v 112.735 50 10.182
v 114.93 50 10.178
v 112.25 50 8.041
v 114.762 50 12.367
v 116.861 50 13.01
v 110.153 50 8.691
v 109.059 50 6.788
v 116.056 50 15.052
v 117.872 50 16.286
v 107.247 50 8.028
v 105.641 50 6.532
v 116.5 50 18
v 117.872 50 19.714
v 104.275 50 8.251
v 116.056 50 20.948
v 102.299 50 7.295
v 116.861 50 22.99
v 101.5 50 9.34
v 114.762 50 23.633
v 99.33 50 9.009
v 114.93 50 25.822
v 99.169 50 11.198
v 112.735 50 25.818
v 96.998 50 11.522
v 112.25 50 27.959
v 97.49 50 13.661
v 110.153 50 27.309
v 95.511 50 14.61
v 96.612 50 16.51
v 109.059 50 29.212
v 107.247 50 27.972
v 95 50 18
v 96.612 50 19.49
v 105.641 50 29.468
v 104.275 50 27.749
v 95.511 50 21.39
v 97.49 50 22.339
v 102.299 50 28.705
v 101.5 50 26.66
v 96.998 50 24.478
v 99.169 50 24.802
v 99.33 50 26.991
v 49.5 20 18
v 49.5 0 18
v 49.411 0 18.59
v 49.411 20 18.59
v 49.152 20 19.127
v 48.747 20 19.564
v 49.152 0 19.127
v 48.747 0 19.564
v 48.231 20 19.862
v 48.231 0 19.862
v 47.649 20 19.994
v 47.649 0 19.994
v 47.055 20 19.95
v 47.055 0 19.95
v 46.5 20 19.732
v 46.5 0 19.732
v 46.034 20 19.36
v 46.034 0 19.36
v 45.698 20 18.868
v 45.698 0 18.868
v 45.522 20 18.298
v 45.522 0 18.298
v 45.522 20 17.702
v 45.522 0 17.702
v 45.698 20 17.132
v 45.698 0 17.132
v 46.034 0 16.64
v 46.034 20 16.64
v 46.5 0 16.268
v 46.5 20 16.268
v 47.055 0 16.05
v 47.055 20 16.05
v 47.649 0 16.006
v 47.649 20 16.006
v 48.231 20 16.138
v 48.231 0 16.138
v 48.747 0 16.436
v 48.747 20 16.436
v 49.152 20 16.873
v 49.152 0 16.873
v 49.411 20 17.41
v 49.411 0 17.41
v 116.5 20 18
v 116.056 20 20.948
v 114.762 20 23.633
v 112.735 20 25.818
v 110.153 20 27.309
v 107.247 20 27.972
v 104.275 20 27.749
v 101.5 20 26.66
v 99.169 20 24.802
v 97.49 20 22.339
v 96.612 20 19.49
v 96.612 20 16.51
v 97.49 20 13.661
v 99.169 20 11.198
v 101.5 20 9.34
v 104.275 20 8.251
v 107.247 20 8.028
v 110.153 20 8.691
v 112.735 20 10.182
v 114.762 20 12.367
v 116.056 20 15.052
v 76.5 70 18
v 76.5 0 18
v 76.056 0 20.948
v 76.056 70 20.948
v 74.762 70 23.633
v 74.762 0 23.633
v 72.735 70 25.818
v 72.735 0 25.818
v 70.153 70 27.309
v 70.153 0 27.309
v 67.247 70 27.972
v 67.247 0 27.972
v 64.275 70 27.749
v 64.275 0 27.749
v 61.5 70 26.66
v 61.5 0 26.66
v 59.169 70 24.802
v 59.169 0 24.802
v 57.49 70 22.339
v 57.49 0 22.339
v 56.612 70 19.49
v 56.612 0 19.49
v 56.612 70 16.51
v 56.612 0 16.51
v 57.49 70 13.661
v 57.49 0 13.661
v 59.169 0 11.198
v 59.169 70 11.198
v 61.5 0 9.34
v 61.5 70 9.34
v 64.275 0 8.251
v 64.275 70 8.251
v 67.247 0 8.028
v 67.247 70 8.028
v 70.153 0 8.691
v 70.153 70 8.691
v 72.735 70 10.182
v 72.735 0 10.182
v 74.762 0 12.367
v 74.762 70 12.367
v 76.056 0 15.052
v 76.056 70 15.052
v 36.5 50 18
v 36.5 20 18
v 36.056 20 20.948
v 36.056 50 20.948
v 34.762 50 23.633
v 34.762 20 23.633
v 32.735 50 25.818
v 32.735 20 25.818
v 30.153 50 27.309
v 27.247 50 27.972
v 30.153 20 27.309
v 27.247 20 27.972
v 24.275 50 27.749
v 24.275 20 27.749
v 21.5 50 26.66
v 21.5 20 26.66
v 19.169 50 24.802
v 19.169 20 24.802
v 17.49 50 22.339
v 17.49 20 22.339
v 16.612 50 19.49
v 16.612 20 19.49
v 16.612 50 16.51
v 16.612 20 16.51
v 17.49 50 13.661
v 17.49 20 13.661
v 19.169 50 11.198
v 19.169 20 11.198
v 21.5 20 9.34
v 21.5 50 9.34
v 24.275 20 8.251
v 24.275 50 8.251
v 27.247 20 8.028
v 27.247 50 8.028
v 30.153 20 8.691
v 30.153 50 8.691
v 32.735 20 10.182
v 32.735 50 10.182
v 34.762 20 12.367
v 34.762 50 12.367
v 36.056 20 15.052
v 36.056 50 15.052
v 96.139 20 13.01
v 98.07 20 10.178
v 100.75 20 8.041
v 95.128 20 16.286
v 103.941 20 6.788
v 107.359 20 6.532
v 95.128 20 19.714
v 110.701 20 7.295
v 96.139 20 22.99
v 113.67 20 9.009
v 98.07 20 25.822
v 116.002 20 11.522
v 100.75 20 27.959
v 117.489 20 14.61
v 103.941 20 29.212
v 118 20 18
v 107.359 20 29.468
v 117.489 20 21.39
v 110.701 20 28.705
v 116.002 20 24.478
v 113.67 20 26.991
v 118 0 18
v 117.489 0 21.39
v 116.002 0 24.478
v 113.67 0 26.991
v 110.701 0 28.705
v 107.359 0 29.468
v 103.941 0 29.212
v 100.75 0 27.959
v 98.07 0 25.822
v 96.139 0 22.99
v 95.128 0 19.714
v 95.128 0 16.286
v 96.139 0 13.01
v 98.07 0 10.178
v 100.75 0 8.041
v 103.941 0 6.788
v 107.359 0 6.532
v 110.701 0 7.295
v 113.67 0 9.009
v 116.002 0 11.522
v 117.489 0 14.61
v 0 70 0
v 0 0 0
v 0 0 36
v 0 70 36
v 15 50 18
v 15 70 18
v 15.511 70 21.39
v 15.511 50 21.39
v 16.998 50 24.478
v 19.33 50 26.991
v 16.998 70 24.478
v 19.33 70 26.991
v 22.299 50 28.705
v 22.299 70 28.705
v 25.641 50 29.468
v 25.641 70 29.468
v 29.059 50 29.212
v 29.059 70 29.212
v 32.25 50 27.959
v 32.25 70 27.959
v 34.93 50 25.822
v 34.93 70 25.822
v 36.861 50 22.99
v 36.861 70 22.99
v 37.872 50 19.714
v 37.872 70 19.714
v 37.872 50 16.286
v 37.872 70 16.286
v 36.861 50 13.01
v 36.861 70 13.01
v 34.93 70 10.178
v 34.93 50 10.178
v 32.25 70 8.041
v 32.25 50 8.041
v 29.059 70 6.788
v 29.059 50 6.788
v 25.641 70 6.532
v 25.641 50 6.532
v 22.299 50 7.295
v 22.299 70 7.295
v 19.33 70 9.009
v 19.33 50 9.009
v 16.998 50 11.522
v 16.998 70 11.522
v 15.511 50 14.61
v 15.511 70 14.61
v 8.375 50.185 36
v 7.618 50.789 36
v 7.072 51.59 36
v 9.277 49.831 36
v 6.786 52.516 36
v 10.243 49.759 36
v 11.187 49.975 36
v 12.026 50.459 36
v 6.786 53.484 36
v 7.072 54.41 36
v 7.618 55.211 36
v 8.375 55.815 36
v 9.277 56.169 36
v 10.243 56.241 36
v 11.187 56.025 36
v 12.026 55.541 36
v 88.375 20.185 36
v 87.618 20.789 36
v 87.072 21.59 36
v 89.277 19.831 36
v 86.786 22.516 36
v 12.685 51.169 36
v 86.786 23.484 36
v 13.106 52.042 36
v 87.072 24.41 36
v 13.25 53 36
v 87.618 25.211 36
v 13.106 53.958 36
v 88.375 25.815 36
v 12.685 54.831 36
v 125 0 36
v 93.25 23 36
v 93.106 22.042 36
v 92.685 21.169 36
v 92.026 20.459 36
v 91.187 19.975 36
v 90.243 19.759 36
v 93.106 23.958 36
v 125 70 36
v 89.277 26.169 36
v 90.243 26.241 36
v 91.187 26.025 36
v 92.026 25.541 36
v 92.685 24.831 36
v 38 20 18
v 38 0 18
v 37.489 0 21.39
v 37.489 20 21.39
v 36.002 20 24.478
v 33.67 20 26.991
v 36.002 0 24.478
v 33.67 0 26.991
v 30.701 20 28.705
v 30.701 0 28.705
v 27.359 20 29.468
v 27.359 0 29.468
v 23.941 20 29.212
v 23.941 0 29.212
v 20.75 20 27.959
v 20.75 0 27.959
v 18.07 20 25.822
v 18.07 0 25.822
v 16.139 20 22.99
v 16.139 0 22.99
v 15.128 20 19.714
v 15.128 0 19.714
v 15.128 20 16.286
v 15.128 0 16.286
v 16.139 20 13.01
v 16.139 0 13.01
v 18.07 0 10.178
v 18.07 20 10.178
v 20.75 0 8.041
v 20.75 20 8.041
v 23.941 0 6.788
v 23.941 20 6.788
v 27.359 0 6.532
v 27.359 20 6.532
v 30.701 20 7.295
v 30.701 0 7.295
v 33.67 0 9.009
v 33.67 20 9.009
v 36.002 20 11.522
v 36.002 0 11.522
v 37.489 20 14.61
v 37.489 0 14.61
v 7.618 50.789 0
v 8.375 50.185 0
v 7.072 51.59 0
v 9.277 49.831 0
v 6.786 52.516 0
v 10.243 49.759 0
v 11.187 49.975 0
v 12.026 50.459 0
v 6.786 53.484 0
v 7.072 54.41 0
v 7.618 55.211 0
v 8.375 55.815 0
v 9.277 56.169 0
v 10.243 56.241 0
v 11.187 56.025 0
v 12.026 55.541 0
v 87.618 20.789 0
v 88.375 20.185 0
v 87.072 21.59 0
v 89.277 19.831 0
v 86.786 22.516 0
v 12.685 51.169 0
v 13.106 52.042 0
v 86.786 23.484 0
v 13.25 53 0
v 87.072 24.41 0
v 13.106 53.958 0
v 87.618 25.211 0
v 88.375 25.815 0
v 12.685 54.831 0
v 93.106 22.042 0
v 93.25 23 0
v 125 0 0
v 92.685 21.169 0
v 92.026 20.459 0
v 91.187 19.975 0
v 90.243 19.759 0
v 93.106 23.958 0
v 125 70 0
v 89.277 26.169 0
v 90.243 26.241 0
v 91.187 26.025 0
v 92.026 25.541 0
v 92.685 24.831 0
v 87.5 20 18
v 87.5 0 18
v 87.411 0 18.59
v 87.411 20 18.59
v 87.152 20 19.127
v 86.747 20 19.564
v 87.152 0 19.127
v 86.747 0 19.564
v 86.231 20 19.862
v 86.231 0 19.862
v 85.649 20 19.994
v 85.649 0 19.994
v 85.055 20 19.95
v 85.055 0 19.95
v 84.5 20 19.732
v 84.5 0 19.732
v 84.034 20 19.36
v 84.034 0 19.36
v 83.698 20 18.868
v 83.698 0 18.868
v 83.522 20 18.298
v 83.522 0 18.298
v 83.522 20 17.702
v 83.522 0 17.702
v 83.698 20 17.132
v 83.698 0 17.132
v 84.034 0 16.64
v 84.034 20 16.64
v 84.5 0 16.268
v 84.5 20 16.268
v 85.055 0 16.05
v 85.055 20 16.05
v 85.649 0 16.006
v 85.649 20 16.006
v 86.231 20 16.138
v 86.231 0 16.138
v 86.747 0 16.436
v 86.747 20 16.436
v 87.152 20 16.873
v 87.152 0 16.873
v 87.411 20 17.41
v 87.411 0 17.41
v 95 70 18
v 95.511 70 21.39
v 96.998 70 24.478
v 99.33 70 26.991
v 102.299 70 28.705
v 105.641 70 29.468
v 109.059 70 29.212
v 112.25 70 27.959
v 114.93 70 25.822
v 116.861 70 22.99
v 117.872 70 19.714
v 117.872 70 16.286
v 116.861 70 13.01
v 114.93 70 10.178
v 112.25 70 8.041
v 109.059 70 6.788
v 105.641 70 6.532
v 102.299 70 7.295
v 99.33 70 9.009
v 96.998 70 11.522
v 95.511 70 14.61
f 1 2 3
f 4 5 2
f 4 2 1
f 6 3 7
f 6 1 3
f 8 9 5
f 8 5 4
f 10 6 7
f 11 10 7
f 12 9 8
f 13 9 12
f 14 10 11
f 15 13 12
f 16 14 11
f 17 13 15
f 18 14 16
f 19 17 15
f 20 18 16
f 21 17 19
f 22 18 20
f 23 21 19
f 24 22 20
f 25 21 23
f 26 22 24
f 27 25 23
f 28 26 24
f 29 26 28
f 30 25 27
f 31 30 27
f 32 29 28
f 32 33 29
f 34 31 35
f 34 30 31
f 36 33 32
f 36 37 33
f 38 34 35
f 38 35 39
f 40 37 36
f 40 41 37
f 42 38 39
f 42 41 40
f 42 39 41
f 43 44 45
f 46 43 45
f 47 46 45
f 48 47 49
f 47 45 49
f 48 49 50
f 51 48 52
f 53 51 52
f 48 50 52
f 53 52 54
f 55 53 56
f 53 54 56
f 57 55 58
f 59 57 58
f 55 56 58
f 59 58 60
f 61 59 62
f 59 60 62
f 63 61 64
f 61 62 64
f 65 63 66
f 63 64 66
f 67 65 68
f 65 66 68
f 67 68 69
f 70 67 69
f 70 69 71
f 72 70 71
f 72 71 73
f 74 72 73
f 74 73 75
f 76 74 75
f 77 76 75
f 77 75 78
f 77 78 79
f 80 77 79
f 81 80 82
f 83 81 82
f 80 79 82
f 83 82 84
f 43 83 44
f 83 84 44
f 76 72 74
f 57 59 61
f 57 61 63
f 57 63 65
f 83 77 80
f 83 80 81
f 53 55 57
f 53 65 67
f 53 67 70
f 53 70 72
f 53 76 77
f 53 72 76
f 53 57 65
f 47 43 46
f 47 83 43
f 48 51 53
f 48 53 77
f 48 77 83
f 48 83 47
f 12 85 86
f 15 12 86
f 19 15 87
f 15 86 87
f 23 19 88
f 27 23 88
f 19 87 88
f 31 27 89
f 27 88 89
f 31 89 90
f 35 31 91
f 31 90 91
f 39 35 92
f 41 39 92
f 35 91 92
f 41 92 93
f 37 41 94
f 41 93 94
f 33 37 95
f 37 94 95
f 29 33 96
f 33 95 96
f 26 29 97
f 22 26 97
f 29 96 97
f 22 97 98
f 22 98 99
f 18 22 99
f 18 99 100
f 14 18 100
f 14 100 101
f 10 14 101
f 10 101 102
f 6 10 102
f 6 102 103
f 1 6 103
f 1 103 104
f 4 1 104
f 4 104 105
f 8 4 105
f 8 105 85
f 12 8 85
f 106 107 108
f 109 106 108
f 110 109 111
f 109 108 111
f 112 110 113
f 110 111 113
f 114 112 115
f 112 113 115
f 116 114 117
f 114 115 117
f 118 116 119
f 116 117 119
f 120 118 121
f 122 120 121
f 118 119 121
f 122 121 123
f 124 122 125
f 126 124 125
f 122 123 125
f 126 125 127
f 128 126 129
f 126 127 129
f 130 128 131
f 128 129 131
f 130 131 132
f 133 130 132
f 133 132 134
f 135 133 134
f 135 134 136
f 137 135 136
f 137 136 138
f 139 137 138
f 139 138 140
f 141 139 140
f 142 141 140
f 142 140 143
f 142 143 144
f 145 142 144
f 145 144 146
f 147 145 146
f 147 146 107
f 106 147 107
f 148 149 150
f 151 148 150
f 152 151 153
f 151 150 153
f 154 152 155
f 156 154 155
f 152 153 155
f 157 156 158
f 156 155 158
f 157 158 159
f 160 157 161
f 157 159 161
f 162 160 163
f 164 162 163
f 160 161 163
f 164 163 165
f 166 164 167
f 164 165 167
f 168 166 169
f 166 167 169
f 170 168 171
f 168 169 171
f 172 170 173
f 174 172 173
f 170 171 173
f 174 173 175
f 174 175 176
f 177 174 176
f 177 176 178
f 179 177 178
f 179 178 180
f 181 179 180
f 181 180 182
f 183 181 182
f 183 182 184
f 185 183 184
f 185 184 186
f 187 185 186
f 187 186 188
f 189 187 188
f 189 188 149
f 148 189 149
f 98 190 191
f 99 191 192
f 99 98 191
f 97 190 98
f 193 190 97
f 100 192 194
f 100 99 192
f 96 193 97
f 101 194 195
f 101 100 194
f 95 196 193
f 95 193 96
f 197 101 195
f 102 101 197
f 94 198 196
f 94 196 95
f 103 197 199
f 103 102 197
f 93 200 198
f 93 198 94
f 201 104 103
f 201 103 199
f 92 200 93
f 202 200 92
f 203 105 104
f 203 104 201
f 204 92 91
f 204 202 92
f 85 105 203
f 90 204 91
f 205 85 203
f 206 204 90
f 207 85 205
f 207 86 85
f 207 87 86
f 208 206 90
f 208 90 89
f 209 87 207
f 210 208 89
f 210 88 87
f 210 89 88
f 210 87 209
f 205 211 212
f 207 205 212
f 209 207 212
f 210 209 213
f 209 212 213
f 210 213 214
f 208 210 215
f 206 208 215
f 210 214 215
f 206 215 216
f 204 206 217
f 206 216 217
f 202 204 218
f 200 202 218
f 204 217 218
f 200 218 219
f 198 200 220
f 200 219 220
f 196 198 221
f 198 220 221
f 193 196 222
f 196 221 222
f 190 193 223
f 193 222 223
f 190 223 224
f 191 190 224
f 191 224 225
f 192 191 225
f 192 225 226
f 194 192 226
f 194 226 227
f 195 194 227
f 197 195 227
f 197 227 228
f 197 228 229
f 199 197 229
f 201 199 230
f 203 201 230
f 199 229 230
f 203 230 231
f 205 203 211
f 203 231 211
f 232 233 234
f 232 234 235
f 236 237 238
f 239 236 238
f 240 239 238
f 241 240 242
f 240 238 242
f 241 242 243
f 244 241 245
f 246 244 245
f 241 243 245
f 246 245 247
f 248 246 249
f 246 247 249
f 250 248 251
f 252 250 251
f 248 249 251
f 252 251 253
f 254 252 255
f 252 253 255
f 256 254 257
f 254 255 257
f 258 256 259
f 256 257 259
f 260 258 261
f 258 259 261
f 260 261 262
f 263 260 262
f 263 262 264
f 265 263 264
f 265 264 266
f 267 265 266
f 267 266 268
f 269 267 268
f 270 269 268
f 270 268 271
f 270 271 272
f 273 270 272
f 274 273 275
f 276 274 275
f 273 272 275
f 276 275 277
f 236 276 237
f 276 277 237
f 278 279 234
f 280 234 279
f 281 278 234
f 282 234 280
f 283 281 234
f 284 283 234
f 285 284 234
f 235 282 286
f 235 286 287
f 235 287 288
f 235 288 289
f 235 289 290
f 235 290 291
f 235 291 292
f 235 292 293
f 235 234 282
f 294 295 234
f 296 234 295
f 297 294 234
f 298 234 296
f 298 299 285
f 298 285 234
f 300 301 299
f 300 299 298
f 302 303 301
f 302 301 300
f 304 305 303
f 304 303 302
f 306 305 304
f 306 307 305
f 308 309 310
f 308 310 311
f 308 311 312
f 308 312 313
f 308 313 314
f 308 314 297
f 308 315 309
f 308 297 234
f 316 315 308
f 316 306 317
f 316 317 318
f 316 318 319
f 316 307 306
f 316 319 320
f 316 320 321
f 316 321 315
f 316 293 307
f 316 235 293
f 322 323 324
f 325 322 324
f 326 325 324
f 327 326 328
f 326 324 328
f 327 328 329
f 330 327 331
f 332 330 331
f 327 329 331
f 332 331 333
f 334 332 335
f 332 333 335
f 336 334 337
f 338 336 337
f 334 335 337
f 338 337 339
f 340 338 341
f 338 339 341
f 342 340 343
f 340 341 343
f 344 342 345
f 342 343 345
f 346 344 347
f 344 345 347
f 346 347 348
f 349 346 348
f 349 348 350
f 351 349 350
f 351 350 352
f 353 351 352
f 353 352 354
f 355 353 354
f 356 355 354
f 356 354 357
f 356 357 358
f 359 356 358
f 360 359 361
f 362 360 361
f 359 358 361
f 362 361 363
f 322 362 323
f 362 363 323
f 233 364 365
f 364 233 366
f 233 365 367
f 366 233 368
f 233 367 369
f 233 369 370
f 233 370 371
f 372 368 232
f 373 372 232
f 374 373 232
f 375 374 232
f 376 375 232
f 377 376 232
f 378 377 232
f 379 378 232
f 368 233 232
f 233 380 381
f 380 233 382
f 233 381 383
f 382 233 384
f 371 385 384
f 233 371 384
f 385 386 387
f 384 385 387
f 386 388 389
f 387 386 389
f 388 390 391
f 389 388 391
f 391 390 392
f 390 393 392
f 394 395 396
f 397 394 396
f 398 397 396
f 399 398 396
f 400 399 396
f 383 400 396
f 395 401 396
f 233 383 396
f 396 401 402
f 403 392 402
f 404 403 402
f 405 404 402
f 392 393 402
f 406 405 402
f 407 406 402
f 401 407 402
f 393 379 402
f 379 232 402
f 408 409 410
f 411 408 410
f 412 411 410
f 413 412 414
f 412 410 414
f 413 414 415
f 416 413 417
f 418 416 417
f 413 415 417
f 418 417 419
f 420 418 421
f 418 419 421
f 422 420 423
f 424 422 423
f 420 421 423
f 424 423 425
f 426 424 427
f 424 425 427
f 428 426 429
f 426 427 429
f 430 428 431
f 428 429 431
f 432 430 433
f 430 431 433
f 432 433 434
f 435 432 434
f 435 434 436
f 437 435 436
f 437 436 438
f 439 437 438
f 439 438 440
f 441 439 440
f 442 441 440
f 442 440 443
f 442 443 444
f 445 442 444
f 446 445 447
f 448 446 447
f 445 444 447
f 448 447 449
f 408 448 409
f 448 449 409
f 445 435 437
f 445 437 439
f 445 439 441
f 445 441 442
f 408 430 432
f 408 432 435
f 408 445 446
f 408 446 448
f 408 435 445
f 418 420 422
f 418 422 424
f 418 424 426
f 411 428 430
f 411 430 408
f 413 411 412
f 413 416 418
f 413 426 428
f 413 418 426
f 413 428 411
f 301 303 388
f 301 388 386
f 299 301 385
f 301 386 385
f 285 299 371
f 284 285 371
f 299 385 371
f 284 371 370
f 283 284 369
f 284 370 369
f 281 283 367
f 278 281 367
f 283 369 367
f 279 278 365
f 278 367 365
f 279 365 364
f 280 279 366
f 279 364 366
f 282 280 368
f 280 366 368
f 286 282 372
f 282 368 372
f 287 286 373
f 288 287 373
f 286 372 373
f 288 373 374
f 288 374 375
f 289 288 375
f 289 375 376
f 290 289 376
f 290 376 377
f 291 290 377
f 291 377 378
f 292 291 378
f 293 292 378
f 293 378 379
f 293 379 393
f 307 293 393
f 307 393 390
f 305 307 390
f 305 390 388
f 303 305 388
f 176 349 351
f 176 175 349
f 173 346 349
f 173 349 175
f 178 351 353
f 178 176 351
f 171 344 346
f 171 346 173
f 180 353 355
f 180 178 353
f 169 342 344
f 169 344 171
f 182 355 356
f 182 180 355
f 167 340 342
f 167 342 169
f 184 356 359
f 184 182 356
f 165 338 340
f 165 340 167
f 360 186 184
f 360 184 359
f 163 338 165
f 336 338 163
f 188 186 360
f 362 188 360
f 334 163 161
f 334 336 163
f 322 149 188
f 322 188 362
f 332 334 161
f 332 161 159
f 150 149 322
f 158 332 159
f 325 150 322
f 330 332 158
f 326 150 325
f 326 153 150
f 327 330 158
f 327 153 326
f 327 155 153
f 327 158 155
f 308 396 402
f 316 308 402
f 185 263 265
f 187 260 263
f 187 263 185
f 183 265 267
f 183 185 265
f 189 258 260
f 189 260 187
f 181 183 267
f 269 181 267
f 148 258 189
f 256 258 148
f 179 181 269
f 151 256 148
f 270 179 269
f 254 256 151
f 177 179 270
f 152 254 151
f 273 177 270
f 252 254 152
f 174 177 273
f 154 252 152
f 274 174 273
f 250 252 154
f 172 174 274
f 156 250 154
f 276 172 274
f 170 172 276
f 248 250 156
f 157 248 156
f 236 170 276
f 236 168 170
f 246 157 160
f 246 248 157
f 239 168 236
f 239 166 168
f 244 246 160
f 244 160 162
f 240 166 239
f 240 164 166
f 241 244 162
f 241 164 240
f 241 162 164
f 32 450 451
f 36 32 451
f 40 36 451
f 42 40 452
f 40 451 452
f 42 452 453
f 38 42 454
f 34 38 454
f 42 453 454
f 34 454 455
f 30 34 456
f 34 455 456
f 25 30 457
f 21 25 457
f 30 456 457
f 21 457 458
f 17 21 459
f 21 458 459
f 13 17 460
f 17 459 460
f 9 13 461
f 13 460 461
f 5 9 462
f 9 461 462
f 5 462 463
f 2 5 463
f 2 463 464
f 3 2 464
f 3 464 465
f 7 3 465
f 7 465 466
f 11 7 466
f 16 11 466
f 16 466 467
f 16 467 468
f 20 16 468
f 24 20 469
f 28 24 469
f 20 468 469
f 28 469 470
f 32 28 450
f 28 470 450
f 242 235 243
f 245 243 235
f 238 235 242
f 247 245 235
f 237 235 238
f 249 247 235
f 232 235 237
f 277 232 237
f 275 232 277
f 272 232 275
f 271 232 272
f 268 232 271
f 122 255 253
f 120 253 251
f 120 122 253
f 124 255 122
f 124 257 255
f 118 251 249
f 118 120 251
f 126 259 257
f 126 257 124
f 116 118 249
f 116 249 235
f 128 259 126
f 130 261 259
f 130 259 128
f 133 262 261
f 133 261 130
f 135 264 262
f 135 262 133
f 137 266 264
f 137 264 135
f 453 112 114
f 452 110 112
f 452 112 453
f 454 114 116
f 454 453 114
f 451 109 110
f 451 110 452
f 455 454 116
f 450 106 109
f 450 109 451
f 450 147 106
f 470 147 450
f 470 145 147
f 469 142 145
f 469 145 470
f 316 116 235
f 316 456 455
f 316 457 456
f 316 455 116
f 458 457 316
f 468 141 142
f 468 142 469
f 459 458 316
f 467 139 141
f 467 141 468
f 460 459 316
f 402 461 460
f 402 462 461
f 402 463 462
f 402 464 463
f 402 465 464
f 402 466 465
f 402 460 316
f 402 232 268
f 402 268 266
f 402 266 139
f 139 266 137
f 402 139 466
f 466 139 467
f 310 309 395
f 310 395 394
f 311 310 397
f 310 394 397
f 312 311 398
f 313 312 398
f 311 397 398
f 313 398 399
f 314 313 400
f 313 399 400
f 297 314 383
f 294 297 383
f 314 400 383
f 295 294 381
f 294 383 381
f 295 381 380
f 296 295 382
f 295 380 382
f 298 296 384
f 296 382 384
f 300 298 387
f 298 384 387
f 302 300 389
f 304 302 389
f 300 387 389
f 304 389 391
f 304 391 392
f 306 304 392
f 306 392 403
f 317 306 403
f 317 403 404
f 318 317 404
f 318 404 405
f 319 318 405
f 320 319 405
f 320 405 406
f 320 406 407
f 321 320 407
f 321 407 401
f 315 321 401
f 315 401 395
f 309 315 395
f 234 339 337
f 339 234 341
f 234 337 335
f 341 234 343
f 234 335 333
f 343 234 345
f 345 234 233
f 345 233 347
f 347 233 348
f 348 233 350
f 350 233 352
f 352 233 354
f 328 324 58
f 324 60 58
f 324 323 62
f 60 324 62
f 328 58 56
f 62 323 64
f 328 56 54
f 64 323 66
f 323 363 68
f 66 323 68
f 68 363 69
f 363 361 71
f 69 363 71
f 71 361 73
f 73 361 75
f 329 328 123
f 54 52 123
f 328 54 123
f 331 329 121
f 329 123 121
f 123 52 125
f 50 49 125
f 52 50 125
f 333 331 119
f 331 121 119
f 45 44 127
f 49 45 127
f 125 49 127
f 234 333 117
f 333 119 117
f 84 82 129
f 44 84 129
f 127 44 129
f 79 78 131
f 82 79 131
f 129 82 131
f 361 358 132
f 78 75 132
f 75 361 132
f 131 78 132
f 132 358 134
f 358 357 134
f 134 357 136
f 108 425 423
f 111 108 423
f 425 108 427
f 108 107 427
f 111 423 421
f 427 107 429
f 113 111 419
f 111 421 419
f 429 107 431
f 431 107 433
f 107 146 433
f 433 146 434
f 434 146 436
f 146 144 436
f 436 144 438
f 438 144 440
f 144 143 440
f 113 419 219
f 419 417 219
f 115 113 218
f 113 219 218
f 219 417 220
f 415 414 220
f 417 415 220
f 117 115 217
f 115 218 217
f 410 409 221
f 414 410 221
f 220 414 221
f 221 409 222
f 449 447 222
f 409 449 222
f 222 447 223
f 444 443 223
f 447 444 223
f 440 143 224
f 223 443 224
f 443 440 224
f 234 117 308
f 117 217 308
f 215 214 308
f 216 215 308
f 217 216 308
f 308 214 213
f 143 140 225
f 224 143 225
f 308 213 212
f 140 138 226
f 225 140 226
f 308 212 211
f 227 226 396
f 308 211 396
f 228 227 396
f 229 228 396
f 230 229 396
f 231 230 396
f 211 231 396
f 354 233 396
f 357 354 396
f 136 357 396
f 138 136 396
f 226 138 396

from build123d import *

# Parameters (mm, degrees)
F0_W      = 125
F0_H      = 70
F1_DEPTH  = 36
F2_R      = 10
F3_DEPTH  = 70.001
F4_R      = 11.5
F5_DEPTH  = 20
F6_R      = 11.5
F7_DEPTH  = 20
F8_R      = 3.25
F8_R_2    = 12.900097
F9_DEPTH  = 36.001
F10_R     = 2
F11_DEPTH = 20


with BuildPart() as f1:
    # F0 (on Top) → F1 (new body)
    with BuildSketch(Plane.XY):
        with Locations((62.5, 35)):
            Rectangle(F0_W, F0_H)
    extrude(amount=F1_DEPTH)

    # F2 (on face) → F3 (cut, through all)
    with BuildSketch(Plane.XZ):
        with Locations((26.5, 18)):
            Circle(F2_R)
        with Locations((66.5, 18)):
            Circle(F2_R)
        with Locations((106.5, 18)):
            Circle(F2_R)
    extrude(amount=-F3_DEPTH, mode=Mode.SUBTRACT)

    # F4 (on face) → F5 (cut)
    with BuildSketch(Plane.XZ):
        with Locations((26.5, 18)):
            Circle(F4_R)
        with Locations((106.5, 18)):
            Circle(F4_R)
    extrude(amount=-F5_DEPTH, mode=Mode.SUBTRACT)

    # F6 (on face) → F7 (cut)
    with BuildSketch(Plane(origin=(0, 70, 0), x_dir=(-1, 0, 0), z_dir=(0, 1, 0))):
        with Locations((-106.5, 18)):
            Circle(F6_R)
        with Locations((-26.5, 18)):
            Circle(F6_R)
    extrude(amount=-F7_DEPTH, mode=Mode.SUBTRACT)

    # F8 (on face) → F9 (cut, through all)
    with BuildSketch(Plane(origin=(0, 0, 0), x_dir=(1, 0, 0), z_dir=(0, 0, -1))):
        with Locations((90, -23)):
            Circle(F8_R)
        with Locations((125.049993, 12.9)):
            Circle(F8_R_2)
        with Locations((10, -53)):
            Circle(F8_R)
    extrude(amount=-F9_DEPTH, mode=Mode.SUBTRACT)

    # F10 (on face) → F11 (cut)
    with BuildSketch(Plane.XZ):
        with Locations((47.5, 18)):
            Circle(F10_R)
        with Locations((85.5, 18)):
            Circle(F10_R)
    extrude(amount=-F11_DEPTH, mode=Mode.SUBTRACT)


solid = f1.part
